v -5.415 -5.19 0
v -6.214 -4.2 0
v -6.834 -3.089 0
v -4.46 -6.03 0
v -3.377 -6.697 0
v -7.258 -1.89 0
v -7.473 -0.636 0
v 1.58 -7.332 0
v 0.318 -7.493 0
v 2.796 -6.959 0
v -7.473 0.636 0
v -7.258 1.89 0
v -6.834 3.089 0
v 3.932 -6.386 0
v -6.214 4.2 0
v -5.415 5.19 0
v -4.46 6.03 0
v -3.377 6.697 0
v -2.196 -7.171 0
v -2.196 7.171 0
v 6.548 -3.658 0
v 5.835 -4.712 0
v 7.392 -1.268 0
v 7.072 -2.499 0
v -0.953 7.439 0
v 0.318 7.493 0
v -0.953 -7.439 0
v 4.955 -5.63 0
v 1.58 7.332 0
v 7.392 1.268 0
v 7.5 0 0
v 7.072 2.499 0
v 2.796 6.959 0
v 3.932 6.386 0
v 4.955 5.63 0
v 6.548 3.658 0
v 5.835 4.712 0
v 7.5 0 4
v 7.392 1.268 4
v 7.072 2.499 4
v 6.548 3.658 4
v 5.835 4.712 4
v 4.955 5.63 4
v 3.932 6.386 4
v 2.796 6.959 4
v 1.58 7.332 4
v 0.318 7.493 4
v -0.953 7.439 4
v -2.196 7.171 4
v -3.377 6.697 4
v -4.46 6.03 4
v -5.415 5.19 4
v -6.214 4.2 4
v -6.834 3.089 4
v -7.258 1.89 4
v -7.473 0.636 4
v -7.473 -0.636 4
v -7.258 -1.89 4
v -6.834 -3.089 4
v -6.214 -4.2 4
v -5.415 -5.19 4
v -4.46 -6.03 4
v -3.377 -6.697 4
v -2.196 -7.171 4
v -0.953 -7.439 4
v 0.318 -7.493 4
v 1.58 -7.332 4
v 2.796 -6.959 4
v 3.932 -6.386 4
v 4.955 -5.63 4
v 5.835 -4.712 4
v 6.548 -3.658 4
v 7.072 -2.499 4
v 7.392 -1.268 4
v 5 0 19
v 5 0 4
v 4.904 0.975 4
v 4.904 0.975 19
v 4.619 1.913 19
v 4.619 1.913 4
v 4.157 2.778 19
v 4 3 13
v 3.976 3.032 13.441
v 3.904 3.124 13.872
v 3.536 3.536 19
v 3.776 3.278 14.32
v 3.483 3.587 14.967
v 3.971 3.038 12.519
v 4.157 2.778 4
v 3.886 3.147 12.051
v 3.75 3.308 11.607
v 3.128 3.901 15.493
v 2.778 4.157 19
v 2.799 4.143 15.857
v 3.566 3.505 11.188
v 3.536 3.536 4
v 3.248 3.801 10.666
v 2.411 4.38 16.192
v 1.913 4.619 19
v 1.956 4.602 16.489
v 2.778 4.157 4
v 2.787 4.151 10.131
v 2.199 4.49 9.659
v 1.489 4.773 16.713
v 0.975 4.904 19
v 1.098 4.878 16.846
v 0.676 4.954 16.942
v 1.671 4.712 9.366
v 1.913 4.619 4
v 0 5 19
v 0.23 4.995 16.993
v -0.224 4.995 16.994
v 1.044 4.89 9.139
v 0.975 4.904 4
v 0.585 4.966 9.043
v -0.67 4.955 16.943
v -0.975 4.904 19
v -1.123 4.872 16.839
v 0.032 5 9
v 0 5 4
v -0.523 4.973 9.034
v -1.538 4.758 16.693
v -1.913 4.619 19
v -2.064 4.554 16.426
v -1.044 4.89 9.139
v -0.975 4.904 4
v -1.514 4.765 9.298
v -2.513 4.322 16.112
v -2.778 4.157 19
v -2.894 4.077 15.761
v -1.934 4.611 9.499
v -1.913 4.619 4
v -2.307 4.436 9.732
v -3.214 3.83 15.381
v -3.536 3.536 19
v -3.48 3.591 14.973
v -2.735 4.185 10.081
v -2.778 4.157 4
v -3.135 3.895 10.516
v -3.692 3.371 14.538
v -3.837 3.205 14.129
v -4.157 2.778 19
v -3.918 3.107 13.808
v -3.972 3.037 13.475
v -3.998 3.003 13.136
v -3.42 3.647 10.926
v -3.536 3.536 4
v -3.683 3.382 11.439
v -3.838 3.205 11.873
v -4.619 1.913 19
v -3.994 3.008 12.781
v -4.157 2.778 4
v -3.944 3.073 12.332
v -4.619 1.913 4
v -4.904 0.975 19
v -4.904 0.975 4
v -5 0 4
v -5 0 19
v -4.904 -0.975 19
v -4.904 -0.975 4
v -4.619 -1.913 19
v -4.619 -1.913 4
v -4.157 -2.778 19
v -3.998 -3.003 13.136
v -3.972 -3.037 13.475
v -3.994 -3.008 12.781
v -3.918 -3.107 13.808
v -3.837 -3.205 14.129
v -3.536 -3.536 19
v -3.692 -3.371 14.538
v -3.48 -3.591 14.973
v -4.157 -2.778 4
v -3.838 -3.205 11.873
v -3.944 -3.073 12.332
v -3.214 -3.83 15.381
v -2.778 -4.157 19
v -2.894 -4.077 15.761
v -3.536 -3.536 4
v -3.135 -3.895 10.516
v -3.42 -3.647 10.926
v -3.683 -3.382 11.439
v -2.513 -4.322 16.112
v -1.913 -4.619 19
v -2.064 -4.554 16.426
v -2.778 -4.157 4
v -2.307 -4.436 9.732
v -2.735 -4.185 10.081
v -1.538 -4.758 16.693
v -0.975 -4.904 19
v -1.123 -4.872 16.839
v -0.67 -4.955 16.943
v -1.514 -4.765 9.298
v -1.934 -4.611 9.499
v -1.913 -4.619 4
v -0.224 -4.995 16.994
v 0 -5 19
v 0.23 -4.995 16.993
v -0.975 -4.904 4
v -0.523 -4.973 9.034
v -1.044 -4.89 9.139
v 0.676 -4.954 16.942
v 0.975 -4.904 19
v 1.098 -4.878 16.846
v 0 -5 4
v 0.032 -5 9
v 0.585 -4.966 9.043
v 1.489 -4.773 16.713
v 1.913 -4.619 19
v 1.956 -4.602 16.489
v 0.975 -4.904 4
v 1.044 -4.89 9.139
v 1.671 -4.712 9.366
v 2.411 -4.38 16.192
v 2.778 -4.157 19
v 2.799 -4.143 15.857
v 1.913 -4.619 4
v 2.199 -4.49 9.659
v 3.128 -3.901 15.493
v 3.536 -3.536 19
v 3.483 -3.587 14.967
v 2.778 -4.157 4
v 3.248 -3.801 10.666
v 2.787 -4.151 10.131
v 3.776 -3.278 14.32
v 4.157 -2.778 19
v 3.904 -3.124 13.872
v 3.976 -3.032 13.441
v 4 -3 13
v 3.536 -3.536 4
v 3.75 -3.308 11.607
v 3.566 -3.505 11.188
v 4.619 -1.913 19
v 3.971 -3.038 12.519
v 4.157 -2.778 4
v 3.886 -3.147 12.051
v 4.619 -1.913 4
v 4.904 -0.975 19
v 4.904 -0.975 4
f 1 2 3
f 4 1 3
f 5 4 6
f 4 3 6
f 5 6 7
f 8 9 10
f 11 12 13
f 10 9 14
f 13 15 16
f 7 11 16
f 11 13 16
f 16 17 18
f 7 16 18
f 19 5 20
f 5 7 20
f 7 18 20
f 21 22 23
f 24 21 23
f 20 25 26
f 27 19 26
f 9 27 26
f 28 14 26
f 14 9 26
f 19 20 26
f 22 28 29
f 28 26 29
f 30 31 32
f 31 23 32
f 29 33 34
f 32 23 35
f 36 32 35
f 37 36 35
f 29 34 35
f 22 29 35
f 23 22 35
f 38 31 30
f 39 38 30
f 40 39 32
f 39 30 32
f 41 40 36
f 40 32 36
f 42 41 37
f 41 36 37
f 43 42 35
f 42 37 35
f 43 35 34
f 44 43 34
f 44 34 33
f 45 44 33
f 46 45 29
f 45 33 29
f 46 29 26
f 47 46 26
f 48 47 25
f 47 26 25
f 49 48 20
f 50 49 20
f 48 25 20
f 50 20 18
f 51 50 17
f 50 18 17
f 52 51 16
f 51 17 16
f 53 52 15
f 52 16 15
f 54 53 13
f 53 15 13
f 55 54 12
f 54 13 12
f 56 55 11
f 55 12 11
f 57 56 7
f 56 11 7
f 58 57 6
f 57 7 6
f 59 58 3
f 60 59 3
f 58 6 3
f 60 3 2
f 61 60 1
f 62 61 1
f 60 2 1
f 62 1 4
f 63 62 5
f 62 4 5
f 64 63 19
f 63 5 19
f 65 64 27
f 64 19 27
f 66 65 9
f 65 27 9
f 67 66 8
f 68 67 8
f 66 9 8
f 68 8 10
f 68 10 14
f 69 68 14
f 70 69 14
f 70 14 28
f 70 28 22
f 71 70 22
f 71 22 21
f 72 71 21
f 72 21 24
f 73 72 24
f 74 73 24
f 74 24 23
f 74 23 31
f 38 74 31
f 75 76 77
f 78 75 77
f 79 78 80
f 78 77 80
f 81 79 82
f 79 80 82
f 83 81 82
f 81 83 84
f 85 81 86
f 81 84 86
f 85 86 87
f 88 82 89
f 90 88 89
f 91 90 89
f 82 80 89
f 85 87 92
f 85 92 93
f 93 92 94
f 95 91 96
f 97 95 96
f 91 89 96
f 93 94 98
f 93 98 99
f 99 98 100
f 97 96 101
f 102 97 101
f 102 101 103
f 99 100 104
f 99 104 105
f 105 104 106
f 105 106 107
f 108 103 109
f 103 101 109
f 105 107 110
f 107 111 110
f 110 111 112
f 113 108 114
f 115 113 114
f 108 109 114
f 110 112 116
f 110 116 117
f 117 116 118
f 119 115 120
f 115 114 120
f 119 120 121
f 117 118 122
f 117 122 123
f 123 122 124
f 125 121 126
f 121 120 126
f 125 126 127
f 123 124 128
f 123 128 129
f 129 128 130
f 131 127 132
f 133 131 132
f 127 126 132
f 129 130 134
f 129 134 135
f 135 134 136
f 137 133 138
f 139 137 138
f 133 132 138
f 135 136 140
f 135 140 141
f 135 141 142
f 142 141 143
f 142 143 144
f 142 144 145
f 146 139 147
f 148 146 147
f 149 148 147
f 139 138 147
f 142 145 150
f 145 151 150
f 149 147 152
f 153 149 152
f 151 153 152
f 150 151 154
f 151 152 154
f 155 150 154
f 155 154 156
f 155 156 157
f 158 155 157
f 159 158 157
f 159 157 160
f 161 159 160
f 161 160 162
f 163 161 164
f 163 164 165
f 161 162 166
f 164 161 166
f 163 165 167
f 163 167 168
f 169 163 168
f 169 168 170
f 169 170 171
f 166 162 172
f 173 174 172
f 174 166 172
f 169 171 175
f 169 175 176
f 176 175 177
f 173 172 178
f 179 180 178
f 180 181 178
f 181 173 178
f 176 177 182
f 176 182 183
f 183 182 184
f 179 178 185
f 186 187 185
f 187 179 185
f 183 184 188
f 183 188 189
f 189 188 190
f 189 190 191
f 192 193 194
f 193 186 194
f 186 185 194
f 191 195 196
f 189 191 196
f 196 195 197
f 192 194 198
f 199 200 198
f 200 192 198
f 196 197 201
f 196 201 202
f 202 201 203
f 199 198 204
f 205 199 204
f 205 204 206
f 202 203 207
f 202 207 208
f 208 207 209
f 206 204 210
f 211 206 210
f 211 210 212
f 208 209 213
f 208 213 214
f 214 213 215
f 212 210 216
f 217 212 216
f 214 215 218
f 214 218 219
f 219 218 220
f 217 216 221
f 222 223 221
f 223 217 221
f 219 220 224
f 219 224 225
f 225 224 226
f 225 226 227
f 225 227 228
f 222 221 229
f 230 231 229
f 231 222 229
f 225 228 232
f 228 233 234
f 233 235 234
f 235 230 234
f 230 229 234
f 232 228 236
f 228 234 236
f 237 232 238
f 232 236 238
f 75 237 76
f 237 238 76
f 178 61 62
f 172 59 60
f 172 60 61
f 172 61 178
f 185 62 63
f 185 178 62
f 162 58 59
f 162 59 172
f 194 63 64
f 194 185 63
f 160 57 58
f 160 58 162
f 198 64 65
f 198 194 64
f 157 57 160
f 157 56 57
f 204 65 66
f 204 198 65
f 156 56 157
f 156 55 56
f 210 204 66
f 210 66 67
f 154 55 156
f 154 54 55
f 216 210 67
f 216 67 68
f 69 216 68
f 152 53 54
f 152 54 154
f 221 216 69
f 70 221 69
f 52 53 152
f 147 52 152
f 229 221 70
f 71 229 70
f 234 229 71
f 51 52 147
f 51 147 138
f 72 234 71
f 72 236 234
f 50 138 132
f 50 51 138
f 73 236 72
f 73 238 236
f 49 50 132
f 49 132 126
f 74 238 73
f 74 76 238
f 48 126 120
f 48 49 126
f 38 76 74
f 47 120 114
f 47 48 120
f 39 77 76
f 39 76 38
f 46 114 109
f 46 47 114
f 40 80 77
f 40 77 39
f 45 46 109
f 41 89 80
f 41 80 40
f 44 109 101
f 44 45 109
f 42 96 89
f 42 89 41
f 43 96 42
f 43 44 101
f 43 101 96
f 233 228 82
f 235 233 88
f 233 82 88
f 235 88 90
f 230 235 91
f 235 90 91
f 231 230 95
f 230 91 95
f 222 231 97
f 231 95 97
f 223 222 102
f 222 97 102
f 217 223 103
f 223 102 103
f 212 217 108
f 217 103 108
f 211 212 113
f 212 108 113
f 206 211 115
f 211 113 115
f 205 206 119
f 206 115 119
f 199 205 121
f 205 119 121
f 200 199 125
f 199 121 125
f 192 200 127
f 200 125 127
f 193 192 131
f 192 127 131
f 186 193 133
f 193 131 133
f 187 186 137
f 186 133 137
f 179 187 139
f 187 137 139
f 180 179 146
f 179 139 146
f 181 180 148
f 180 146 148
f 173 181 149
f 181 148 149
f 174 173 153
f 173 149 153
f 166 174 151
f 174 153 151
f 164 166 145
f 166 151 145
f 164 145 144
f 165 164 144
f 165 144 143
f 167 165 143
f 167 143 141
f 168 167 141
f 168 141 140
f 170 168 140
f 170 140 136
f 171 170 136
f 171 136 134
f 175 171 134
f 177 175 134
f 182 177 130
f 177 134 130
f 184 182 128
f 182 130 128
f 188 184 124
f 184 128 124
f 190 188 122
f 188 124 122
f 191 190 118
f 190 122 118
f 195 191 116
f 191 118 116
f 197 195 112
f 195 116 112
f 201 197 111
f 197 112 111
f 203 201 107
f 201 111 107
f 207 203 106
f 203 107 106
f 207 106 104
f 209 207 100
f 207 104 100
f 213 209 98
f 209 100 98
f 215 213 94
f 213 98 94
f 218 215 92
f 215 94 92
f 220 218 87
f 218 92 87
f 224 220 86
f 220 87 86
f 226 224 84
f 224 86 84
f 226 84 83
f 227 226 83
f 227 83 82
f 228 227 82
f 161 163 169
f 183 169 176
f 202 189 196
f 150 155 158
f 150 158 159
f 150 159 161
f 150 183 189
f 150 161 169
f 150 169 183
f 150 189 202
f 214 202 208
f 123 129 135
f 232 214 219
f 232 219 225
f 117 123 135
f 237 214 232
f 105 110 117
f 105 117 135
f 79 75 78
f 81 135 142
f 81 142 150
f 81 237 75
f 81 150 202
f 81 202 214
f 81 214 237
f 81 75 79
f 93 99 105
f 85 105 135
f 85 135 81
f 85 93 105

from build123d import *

# Parameters (mm, degrees)
SKETCH1_R           = 7.5
BOSS_EXTRUDE1_DEPTH = 4
SKETCH2_R           = 5
BOSS_EXTRUDE2_DEPTH = 15
SKETCH3_R           = 4
CUT_EXTRUDE1_DEPTH  = 7


with BuildPart() as part:
    # Sketch1 → Boss-Extrude1 (new body)
    with BuildSketch(Plane.XY):
        Circle(SKETCH1_R)
    extrude(amount=BOSS_EXTRUDE1_DEPTH)

    # Sketch2 → Boss-Extrude2 (add)
    with BuildSketch(Plane.XY.offset(4)):
        Circle(SKETCH2_R)
    extrude(amount=BOSS_EXTRUDE2_DEPTH)

    # Sketch3 → Cut-Extrude1 (cut, symmetric)
    with BuildSketch(Plane(origin=(0, 0, 0), x_dir=(1, 0, 0), z_dir=(0, 1, 0))):
        with Locations((0, -13)):
            Circle(SKETCH3_R)
    extrude(amount=CUT_EXTRUDE1_DEPTH, both=True, mode=Mode.SUBTRACT)


solid = part.part
